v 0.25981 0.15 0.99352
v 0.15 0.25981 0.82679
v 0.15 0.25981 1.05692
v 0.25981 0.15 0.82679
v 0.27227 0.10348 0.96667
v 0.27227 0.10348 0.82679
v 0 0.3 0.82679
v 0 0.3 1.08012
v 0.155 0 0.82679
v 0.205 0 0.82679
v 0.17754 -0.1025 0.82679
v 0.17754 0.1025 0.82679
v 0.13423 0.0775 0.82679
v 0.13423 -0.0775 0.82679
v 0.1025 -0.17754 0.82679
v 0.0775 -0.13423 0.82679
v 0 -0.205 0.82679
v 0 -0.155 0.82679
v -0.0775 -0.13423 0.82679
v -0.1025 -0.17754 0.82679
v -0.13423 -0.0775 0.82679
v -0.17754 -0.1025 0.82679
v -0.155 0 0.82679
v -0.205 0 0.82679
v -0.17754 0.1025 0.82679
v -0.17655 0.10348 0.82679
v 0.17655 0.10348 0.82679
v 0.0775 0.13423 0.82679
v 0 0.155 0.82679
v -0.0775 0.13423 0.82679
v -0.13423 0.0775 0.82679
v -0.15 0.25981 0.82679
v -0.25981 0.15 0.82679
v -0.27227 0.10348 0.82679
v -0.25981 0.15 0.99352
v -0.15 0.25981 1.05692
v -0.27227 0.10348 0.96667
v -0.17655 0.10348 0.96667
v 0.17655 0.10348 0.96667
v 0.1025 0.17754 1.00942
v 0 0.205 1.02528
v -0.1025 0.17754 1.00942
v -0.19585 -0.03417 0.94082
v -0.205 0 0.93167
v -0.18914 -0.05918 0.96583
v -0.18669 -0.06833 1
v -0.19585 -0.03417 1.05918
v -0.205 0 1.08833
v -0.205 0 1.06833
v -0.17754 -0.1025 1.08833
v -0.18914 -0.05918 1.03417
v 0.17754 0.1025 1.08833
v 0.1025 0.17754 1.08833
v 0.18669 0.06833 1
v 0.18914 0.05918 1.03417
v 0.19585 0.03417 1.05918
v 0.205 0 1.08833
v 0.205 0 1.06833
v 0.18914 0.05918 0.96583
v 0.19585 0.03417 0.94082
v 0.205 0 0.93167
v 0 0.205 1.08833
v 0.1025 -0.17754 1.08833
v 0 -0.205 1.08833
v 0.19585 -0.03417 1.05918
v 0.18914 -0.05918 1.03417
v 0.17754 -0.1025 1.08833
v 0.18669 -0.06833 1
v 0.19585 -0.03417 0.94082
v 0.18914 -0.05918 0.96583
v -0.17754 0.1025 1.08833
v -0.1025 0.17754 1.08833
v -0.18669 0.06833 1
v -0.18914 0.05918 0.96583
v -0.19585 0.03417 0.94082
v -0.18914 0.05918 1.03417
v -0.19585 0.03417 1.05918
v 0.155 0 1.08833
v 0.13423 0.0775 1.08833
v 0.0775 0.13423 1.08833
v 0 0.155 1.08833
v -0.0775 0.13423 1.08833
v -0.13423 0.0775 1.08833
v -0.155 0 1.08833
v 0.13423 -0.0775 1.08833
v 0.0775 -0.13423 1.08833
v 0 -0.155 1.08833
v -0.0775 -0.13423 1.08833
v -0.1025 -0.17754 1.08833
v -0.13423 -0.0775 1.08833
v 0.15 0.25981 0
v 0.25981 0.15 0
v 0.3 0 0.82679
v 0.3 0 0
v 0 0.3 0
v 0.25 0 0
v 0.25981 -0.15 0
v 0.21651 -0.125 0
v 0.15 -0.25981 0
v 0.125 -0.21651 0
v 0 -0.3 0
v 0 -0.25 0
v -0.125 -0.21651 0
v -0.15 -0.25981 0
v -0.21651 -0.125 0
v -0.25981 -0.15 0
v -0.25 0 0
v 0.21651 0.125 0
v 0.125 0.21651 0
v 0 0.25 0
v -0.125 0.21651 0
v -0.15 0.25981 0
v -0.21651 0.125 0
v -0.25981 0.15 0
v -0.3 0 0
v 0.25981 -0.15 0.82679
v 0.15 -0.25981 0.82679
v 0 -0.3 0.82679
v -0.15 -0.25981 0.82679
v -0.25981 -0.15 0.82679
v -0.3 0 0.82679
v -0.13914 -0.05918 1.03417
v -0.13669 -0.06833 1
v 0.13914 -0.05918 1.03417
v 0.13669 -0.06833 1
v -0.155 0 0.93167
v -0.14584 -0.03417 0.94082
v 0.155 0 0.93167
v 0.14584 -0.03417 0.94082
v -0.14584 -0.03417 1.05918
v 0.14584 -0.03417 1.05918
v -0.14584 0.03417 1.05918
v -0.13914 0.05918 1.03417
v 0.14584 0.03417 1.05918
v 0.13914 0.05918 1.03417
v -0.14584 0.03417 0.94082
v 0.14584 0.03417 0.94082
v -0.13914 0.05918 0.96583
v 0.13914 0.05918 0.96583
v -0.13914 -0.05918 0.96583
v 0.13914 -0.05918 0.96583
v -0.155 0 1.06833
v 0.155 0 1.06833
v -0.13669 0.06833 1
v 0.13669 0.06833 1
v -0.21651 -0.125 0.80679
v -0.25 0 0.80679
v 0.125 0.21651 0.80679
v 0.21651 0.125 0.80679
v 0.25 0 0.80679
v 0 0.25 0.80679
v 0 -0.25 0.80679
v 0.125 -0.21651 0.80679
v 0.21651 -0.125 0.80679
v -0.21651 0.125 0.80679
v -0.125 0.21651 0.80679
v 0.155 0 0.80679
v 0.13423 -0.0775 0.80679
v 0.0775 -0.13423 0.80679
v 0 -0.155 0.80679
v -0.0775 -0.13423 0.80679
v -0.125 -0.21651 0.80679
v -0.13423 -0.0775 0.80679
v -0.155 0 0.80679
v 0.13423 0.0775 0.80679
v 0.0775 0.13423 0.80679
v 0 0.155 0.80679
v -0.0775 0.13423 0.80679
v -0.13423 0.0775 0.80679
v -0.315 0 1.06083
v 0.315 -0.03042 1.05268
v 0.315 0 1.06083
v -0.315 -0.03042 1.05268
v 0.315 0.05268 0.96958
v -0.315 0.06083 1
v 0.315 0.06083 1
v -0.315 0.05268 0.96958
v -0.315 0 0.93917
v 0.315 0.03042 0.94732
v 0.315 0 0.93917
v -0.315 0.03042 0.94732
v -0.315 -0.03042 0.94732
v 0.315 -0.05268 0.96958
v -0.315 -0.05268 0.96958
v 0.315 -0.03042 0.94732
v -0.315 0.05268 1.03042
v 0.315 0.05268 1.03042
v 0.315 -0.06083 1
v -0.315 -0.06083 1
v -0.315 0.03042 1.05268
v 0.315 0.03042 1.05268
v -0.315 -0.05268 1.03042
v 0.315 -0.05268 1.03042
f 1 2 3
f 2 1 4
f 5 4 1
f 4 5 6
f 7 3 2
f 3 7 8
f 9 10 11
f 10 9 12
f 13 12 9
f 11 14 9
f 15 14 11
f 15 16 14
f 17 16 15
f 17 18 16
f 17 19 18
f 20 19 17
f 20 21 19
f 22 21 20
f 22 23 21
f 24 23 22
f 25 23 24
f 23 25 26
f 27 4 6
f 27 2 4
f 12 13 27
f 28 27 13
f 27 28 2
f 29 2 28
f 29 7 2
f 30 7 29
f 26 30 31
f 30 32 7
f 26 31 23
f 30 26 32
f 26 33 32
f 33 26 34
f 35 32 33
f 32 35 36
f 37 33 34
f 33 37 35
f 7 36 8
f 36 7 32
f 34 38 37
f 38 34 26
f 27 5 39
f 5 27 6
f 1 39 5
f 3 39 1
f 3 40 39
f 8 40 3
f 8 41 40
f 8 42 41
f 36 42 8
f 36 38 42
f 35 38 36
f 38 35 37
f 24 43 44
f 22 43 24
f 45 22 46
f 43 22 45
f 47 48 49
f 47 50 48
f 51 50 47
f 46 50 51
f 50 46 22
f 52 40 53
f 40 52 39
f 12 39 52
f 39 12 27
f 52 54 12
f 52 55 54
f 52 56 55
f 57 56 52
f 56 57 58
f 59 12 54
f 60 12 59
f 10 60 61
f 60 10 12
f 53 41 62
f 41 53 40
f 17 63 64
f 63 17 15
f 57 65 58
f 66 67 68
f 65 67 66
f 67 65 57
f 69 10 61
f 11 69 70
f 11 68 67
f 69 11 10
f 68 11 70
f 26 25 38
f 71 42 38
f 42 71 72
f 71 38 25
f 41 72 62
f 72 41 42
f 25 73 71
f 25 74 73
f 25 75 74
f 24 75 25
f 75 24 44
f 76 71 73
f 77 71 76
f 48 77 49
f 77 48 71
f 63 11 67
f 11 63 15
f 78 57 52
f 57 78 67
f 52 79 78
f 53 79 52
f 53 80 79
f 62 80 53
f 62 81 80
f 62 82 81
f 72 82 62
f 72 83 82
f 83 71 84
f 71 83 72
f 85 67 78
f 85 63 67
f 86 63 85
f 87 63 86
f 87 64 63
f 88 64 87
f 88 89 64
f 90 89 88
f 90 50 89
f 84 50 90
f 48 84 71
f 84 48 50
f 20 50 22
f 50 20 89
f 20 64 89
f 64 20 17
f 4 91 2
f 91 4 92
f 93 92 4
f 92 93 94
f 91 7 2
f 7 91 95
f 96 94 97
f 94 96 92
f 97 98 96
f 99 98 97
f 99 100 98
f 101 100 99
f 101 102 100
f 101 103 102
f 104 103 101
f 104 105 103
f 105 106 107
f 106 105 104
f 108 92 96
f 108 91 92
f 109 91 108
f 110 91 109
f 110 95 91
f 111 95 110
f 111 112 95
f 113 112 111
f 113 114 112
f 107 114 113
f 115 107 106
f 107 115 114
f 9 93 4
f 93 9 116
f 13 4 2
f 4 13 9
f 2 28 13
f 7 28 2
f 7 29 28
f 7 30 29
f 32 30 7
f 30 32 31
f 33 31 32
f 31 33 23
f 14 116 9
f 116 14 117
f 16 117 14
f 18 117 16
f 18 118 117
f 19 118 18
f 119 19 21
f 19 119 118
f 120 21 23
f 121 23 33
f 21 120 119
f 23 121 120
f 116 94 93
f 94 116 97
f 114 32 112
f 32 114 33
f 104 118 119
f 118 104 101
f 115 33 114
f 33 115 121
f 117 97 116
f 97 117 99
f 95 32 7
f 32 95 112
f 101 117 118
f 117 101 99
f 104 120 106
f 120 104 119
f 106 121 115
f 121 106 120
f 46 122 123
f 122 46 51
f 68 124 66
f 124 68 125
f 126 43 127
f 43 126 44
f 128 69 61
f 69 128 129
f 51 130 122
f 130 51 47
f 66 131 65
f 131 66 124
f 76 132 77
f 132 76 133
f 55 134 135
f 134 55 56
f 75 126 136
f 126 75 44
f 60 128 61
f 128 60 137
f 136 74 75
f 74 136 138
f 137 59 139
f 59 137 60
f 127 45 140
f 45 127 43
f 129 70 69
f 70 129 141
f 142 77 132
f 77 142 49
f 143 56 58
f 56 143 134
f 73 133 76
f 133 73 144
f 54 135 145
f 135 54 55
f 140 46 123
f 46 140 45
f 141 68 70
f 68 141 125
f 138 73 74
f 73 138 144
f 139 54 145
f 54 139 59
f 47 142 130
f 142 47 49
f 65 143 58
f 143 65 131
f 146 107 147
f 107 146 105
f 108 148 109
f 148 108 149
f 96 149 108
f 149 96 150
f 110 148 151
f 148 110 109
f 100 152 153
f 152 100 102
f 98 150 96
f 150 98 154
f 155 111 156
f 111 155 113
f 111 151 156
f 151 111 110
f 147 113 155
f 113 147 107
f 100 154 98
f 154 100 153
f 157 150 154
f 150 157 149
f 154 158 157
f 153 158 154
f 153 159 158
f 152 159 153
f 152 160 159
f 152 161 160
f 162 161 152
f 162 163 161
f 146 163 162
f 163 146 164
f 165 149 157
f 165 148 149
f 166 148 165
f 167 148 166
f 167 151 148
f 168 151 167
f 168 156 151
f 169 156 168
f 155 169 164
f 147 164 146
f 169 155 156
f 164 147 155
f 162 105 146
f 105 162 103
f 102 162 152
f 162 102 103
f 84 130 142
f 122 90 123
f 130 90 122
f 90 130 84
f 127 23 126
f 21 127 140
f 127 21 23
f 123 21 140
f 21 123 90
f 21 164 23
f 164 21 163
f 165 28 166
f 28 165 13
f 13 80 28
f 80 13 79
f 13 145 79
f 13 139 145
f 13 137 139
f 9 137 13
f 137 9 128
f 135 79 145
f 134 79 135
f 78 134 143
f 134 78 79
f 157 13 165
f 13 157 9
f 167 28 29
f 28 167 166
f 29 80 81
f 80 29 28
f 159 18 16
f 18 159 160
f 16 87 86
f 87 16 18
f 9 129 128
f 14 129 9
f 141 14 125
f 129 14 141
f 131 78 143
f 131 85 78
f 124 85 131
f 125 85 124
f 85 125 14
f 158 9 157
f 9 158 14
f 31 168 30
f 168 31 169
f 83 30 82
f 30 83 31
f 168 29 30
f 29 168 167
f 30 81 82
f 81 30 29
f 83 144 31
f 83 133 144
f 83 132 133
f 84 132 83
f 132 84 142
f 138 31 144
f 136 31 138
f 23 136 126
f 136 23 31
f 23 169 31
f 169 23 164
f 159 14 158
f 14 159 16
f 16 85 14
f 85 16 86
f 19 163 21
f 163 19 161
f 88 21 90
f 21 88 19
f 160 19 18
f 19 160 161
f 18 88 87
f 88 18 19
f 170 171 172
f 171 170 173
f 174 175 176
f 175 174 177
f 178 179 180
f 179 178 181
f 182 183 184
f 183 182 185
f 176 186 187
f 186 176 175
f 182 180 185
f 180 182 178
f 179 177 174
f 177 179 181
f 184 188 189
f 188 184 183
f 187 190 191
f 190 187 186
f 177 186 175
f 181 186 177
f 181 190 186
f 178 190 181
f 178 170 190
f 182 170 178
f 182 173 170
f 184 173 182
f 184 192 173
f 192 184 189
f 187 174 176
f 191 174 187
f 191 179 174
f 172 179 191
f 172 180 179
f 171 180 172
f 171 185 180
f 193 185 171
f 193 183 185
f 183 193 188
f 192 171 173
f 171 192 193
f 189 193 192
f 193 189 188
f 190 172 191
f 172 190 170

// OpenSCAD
tolerance = 0.015;
hole_radius = 0.045;
grid_hole_radius = 0.03;
outer_radius = 0.3;
thickness = 0.05;
hole_attach_height = 0.02;
attach_thickness = 0.02;
bottom_rotation_height = 1;
top_rotation_height = 0.7;
next_hole_radius = 0.045;
next_hole_attach_height = 0.02;
next_inner = 0.2;
max_turn = 60;
min_turn = -30;
hole_twist = 0;

//parameters that don't have to be defined explicitly
eps = tolerance/100;
inner_radius = outer_radius - thickness;
axle_offset = attach_thickness;
bottom_joint_attach_radius = outer_radius - hole_attach_height - grid_hole_radius*2 - tolerance;
fn = 12;
fnh = 6;

//solve for b = axle height
max_turn_b = outer_radius / tan((180 - max_turn)/2);
min_turn_b = outer_radius / tan((180 - min_turn)/2);
axle_radius = bottom_joint_attach_radius/3;

grid_hole_height = hole_radius*2 + hole_attach_height * 2;
bottom_joint_grid_clearance = bottom_rotation_height - (hole_attach_height*2 + hole_radius*2 + grid_hole_height + max_turn_b + attach_thickness);

module angled_cylinder(angle_deg_y, _h, _r, angle_deg_x = 0) {
    rotate([angle_deg_x, angle_deg_y, 0]) { // Rotate the cylinder 
            cylinder(h = _h, r = _r, center = true, $fn = fnh);
        }
}

module hole(_h) {
    cylinder(h = _h, r = grid_hole_radius, $fn = fnh);
}

//makes circle of holes
module circular_grid(_h, _r, _n) {
    for (i = [0:_n-1]) {
        angle = i * 360 / _n;
        x_pos = _r * cos(angle);
        y_pos = _r * sin(angle);
        translate([x_pos, y_pos, -eps]) {
            hole(_h);
        }
    }
}

//makes grid of holes
module hole_grid(hole_height, grid_h) {
    translate([0,0,hole_height]) {
        difference() {
            //cylinder
            cylinder(h = grid_h, r = (inner_radius + outer_radius)/2, 
                center=false, $fn = fn);
            //holes
            for (i = [0 : grid_hole_radius * 2 + hole_attach_height : inner_radius - grid_hole_radius * 2]) {
                circular_grid(grid_h + eps*2, i, ceil(6.28*i/(grid_hole_radius*4)));
            }
            
        } 
    }
}

module joint_bottom() {
    //make grid of holes
    grid_hole_height = hole_radius*2 + hole_attach_height * 2;
    //hole_grid(grid_hole_height, grid_hole_radius);
    
    bottom_joint_attach_height = max_turn_b + axle_radius + axle_offset;
   
    operating_height = hole_attach_height*2 + attach_thickness + hole_radius*2 + grid_hole_height + bottom_joint_grid_clearance;
    difference() {
        //bottom joint
        union() {
            cylinder(h=operating_height, r=outer_radius, $fn = fn);
            
            translate([0,0,operating_height]) {
                cylinder(h=bottom_joint_attach_height,r=bottom_joint_attach_radius,$fn=fn);
                //enforce min turn
                difference() {
                    cylinder(h=max_turn_b - min_turn_b,r=outer_radius,$fn=fn);
                    translate([-outer_radius,-outer_radius*2,-eps/2])
                    cube([outer_radius*2 + eps,outer_radius*2 + axle_radius + axle_offset + tolerance + eps,max_turn_b - min_turn_b + eps]);
                    
                    translate([-outer_radius,0,max_turn_b])
                    rotate([-(90+min_turn),0,0])
                    translate([0,-max_turn_b + eps/2,-axle_radius-axle_offset])
                    cube([outer_radius*2,max_turn_b - min_turn_b + eps,outer_radius*2+ axle_radius + axle_offset], center=false);
                }
                
                
            }
        }
        
        //hole for axle
        translate([0,0,operating_height + max_turn_b])
        rotate([0,90,0])
        cylinder(h=outer_radius*2,r=axle_radius,center=true,$fn=fn);
        
        //shelling
        cylinder(h=operating_height - attach_thickness, r=inner_radius, center = false, $fn = fn);
        
        cylinder(h=operating_height + bottom_joint_attach_height + eps, r =          bottom_joint_attach_radius - thickness, center = false, $fn = fn);
        //shell tolerance
        cylinder(h=eps, r=inner_radius, center=true,$fn = fn);
        
        //screw holes
//        translate([0,0,hole_radius + hole_attach_height]) 
//        rotate([0,0,hole_twist]) {
//            angled_cylinder(0, (outer_radius*1.5 + eps) * 2,  hole_radius, 90);
//            angled_cylinder(90, (outer_radius*1.5 + eps) * 2, hole_radius, 0);
//        } 
        
        //holes for routing strings
//        translate([0,-inner_radius + thickness,-hole_attach_height - grid_hole_radius + operating_height])
//        rotate([90,0,0])
//        cylinder(h=thickness + inner_radius + eps, r=grid_hole_radius,$fn=fn);
//        
//        translate([0,outer_radius,-hole_attach_height - grid_hole_radius + operating_height + max_turn_b - min_turn_b])
//        rotate([90,0,0])
//        cylinder(h=thickness + inner_radius + eps, r=grid_hole_radius,$fn=fn);
//        
//        translate([0,bottom_joint_attach_radius + hole_attach_height + grid_hole_radius,operating_height - attach_thickness - eps/2])
//        cylinder(h=attach_thickness + max_turn_b - min_turn_b - hole_attach_height + eps, r=grid_hole_radius,$fn=fn);
    }
}

module axle() {
    cylinder(h=outer_radius*2 + tolerance*2, r = axle_radius - tolerance/2, $fn = fn);
}

joint_bottom();

rotate([0,90,0])
translate([-bottom_rotation_height,0,-outer_radius - tolerance])
axle();
